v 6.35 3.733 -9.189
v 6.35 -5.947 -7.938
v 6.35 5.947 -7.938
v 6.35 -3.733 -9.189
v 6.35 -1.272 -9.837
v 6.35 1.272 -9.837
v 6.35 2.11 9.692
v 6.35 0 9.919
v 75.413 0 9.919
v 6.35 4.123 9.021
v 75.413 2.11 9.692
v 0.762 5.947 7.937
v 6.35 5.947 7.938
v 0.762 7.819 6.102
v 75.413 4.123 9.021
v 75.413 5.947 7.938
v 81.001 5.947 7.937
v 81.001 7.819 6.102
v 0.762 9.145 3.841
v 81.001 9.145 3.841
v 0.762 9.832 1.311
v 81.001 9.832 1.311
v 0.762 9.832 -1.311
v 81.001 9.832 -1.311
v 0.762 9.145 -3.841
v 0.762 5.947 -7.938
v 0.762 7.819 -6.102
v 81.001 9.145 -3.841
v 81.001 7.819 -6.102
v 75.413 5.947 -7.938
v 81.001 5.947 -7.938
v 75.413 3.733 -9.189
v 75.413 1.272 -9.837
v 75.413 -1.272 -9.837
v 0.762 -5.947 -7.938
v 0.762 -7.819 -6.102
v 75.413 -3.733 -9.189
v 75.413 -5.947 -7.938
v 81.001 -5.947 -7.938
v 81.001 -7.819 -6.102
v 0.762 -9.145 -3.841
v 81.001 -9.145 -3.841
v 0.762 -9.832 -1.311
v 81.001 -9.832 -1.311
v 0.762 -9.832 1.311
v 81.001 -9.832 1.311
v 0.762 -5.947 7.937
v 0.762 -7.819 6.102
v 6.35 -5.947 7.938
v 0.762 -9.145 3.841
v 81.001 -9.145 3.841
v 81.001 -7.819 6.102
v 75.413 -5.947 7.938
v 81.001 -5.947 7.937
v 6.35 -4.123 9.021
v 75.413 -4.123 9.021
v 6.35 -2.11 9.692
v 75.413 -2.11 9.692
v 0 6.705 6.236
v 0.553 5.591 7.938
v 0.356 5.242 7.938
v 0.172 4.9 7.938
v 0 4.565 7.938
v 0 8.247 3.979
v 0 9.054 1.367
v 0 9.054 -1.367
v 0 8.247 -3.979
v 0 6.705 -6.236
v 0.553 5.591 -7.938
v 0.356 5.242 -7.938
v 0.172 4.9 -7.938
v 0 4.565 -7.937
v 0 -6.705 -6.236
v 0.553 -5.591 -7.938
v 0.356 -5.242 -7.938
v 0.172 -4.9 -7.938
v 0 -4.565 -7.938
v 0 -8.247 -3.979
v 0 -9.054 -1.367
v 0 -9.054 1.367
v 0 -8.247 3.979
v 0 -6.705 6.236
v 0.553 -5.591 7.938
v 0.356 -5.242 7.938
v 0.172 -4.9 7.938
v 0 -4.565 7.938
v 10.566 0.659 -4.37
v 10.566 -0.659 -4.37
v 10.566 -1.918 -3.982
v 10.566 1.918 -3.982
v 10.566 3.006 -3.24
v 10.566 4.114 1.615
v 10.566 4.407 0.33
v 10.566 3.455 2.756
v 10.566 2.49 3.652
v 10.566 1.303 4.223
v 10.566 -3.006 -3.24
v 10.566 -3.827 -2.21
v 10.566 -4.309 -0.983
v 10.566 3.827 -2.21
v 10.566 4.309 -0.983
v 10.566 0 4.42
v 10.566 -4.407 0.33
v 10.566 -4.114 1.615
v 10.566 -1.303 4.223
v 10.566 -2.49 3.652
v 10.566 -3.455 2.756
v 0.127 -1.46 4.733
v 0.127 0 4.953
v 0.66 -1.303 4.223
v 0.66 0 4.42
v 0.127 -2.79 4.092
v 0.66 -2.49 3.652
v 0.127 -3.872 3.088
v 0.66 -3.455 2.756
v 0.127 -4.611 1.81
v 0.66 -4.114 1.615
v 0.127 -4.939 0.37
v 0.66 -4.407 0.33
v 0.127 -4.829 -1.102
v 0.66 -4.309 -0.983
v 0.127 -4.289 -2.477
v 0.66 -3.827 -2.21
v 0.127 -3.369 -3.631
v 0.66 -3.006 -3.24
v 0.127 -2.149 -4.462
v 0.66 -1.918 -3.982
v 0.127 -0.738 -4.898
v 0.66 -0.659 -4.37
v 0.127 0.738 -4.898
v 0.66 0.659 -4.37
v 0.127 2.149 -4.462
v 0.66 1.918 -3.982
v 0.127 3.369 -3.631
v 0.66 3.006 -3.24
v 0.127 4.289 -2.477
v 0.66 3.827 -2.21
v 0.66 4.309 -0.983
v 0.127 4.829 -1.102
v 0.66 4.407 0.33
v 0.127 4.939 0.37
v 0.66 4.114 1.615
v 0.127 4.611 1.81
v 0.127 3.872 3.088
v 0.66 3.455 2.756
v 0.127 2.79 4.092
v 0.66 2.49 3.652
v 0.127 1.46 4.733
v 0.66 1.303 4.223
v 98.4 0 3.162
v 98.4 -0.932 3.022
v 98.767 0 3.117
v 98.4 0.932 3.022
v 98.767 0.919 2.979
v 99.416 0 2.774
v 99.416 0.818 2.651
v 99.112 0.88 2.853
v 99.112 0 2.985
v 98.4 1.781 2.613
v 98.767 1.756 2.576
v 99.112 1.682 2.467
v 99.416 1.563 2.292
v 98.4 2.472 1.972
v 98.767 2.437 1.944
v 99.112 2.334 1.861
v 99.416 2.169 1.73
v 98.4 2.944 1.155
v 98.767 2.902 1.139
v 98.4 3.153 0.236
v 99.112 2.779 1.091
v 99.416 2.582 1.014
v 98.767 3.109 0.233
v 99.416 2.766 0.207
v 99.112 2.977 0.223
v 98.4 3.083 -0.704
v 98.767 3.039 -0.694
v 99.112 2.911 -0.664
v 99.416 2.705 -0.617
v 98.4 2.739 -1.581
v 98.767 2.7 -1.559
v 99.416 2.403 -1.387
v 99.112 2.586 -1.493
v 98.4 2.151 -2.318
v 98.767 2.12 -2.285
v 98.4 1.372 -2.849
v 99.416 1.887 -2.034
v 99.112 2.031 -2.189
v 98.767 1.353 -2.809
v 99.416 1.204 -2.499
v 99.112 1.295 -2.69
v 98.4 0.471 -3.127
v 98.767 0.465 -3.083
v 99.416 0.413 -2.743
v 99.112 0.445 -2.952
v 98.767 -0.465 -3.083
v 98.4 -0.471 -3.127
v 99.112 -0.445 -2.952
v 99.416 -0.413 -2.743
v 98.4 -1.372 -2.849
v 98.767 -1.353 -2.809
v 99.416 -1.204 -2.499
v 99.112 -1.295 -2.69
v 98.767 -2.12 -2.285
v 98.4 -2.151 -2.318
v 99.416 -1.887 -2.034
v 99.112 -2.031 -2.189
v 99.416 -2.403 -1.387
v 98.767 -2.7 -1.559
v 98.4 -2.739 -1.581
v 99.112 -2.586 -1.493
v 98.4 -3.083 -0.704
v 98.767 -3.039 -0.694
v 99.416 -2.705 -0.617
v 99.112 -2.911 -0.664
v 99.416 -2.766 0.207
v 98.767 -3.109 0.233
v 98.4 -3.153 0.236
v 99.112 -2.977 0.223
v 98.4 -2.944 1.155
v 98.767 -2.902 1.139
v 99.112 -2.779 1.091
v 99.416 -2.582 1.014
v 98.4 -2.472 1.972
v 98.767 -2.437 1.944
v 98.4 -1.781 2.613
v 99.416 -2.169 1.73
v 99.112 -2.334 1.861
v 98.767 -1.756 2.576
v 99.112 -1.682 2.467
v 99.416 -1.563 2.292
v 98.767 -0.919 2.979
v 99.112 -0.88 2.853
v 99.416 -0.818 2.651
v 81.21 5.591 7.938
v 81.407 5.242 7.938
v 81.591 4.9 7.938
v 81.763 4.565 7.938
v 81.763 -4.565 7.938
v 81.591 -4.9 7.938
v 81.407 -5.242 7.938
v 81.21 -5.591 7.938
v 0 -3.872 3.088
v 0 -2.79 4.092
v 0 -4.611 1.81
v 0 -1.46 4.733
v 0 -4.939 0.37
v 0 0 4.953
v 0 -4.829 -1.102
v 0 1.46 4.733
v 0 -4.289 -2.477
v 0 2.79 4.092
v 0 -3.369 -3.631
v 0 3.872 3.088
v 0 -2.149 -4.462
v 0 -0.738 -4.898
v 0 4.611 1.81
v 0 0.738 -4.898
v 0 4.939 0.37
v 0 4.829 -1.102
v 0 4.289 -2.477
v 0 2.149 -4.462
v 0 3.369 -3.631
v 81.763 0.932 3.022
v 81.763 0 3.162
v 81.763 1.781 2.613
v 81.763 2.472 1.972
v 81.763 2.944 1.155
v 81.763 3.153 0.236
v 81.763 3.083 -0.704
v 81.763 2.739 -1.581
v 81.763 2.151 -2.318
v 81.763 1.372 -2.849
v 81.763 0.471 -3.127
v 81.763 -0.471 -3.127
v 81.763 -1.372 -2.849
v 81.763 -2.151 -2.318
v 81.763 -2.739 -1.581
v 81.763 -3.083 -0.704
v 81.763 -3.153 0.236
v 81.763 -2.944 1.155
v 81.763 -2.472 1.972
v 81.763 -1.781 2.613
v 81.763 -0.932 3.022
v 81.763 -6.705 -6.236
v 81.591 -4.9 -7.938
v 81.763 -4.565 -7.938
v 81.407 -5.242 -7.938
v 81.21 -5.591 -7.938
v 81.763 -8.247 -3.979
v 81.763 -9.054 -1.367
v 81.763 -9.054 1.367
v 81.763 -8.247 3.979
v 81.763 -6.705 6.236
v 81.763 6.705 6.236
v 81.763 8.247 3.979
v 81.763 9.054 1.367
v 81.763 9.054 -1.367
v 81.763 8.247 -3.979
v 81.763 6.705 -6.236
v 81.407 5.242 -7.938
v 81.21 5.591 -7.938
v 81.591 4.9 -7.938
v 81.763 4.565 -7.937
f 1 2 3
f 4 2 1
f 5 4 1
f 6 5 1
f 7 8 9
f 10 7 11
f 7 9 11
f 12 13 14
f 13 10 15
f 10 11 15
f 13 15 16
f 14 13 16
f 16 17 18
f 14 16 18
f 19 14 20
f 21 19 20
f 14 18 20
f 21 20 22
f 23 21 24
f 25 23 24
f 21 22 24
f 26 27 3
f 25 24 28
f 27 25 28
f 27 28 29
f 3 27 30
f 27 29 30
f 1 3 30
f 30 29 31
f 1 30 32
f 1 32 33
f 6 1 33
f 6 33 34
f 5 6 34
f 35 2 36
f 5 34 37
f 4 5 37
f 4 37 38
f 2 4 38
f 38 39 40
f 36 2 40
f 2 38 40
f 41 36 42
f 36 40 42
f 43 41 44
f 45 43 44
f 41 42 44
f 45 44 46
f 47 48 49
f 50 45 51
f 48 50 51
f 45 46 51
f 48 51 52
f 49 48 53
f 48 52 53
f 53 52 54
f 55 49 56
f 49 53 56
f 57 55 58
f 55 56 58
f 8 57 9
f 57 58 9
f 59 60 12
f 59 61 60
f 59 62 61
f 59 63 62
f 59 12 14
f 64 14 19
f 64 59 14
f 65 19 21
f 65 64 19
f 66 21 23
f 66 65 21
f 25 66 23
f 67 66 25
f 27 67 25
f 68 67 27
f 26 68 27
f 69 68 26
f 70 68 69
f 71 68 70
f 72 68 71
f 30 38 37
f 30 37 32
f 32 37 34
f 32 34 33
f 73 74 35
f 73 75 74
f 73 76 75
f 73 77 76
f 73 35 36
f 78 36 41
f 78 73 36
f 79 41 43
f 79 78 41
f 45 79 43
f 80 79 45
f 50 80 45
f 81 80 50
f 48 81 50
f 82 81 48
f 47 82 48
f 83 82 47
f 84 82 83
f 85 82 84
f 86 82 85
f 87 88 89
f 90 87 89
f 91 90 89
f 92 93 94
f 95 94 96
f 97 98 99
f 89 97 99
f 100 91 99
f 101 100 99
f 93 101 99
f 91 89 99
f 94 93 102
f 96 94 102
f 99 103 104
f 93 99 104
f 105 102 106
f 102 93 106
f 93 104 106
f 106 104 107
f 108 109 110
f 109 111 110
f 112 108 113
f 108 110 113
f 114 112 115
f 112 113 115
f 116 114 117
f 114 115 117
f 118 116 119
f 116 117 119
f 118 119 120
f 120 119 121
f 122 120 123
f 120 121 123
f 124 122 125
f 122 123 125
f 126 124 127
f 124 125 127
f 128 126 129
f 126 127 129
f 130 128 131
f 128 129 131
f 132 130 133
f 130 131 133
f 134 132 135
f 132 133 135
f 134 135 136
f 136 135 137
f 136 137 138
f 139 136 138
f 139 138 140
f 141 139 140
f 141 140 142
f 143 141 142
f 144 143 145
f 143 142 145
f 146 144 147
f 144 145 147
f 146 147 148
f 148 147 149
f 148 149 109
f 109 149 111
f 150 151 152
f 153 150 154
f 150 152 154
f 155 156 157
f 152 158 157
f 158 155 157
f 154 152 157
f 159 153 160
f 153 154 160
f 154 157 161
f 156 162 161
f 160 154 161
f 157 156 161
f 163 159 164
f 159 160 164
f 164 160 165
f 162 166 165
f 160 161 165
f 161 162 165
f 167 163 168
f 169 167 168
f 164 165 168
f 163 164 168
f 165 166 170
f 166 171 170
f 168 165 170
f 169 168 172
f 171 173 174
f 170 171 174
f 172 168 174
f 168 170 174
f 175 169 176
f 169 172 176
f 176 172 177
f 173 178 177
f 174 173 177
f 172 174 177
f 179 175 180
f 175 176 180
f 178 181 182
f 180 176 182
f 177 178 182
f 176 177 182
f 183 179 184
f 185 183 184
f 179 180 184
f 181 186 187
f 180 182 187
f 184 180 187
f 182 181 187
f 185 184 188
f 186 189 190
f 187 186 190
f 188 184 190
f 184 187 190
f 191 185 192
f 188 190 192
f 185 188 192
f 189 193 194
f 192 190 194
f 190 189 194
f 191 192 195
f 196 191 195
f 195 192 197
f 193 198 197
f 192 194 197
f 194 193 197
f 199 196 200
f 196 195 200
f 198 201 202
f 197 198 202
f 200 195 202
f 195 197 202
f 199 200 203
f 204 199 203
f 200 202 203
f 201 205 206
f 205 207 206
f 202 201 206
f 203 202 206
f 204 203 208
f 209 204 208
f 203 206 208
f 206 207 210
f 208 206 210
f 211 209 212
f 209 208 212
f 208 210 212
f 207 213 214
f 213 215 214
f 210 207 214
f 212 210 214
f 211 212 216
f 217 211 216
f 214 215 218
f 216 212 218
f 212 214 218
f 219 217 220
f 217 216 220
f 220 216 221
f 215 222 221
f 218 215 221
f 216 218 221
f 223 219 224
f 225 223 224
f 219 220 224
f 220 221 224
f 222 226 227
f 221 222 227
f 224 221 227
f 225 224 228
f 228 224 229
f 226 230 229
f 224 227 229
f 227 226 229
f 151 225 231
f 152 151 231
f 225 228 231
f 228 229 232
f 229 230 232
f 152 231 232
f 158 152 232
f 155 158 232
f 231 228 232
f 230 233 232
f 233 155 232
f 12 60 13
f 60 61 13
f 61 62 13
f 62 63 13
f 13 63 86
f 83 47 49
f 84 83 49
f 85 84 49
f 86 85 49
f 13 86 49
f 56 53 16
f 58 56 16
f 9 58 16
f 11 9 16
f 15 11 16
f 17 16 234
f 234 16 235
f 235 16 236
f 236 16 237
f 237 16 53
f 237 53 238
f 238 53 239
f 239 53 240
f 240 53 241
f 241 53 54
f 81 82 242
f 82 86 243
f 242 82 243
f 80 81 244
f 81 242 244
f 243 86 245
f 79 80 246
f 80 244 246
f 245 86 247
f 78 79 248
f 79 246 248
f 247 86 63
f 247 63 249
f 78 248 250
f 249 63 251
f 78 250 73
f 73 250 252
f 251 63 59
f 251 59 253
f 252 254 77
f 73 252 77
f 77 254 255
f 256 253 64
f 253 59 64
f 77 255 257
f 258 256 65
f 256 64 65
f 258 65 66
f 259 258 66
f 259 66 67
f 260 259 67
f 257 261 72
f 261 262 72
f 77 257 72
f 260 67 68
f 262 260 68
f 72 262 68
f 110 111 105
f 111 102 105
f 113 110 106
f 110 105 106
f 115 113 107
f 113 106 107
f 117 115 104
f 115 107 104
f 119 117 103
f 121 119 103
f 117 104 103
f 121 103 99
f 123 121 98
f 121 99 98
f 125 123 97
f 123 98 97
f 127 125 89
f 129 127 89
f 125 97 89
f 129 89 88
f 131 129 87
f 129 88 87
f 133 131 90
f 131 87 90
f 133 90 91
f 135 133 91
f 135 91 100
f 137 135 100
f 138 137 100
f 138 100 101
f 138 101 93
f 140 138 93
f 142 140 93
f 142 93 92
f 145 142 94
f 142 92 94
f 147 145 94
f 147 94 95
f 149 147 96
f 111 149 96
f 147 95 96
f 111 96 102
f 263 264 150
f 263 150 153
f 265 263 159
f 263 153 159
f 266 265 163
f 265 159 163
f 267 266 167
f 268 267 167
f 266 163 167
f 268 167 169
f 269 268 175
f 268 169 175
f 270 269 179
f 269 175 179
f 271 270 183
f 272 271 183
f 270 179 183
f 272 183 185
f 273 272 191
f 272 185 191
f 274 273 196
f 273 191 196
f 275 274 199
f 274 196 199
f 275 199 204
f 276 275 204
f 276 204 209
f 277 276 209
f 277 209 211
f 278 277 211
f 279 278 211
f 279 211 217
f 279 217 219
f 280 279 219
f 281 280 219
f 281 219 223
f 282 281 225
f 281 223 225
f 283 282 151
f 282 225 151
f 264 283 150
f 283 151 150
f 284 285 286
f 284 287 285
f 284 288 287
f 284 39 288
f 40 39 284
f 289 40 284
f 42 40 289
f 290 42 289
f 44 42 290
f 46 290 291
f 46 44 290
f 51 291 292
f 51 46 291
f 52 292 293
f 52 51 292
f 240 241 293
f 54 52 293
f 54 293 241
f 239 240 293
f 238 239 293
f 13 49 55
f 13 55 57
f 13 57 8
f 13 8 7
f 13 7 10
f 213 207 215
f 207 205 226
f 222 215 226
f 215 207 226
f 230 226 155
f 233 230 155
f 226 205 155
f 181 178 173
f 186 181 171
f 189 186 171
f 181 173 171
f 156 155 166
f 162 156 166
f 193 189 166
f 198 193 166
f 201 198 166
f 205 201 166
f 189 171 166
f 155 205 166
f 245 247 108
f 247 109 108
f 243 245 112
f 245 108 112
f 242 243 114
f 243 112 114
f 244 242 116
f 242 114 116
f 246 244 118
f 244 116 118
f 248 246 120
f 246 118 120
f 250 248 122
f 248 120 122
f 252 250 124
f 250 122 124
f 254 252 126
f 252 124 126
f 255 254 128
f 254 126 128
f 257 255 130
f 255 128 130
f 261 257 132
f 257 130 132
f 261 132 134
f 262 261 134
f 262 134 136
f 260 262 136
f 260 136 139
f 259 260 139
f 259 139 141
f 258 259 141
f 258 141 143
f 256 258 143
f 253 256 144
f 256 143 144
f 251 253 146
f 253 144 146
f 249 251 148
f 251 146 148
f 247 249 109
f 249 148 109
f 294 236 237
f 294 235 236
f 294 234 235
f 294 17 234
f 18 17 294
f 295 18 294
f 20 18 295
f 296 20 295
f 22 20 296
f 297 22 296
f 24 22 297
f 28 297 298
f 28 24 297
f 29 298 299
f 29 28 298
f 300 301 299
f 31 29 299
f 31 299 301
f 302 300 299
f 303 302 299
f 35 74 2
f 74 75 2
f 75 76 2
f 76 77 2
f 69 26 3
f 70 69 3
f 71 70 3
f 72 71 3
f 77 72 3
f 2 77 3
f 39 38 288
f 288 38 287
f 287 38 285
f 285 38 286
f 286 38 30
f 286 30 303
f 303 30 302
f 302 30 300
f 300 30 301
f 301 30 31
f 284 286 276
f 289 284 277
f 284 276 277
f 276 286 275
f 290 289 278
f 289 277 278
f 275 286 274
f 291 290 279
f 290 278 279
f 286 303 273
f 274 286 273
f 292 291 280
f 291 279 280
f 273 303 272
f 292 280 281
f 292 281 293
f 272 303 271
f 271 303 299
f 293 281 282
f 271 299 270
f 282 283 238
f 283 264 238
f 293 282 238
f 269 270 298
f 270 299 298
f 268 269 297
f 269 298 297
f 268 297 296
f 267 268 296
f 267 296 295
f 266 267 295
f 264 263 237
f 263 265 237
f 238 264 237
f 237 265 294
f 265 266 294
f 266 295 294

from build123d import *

# Parameters (mm, degrees)
CHAMFER1_SIZE           = 0.762
SKETCH5_W               = 6.35
SKETCH5_H               = 1.981
CUT_EXTRUDE1_DEPTH      = 10.9185
CUT_EXTRUDE1_DEPTH_BACK = 10.9185
SKETCH6_W               = 6.35
SKETCH6_H               = 1.981
CUT_EXTRUDE2_DEPTH      = 10.9185
CUT_EXTRUDE2_DEPTH_BACK = 10.9185


with BuildPart() as part:
    # Sketch1 → Revolve1 (revolve)
    with BuildSketch(Plane(origin=(0, 0, 0), x_dir=(-1, 0, 0), z_dir=(0, 0, -1)), mode=Mode.PRIVATE) as revolve1_sk:
        with BuildLine():
            Line((-99.4156, 2.774222533), (-99.4156, 0))
            Line((-99.4156, 0), (0, 0))
            Line((0, 0), (0, 9.9185))
            Line((0, 9.9185), (-81.7626, 9.9185))
            Line((-81.7626, 9.9185), (-81.7626, 3.1623))
            Line((-81.7626, 3.1623), (-98.3996, 3.1623))
            ThreePointArc((-98.3996, 3.1623), (-98.943396865, 3.061978675), (-99.4156, 2.774222533))
        make_face()
    revolve(revolve1_sk.sketch.rotate(Axis((99.4156, 0, 0), (-1, 0, 0)), 270), axis=Axis((99.4156, 0, 0), (-1, 0, 0)))  # turned: the seam where the file's is

    # Sketch2 → Cut-Revolve1 (revolve, cut)
    with BuildSketch(Plane(origin=(0, 0, 0), x_dir=(-1, 0, 0), z_dir=(0, 0, -1)), mode=Mode.PRIVATE) as cut_revolve1_sk:
        Polygon((0, 0), (0, 4.953), (-0.127, 4.953), (-0.6604, 4.4196), (-10.5664, 4.4196), (-10.5664, 0), align=None)
    revolve(cut_revolve1_sk.sketch.rotate(Axis((0, 0, 0), (1, 0, 0)), 90), axis=Axis((0, 0, 0), (1, 0, 0)), mode=Mode.SUBTRACT)  # turned: the seam where the file's is

    # Chamfer1
    chamfer1_edges = [part.edges().sort_by_distance(p)[0] for p in [
        (81.7626, 0, -9.9185),
        (0, 0, -9.9185),
    ]]
    chamfer(chamfer1_edges, length=CHAMFER1_SIZE)

    # Sketch5 → Cut-Extrude1 (cut, two sides)
    with BuildSketch(Plane(origin=(0, 0, 0), x_dir=(1, 0, 0), z_dir=(0, 1, 0))) as cut_extrude1_sk:
        with Locations((3.175, 8.928)):
            Rectangle(SKETCH5_W, SKETCH5_H)
        with Locations((3.175, -8.928)):
            Rectangle(SKETCH5_W, SKETCH5_H)
    extrude(amount=CUT_EXTRUDE1_DEPTH, mode=Mode.SUBTRACT)
    extrude(cut_extrude1_sk.sketch, amount=-CUT_EXTRUDE1_DEPTH_BACK, mode=Mode.SUBTRACT)

    # Sketch6 → Cut-Extrude2 (cut, two sides)
    with BuildSketch(Plane(origin=(0, 0, 0), x_dir=(1, 0, 0), z_dir=(0, 1, 0))) as cut_extrude2_sk:
        with Locations((78.5876, 8.928)):
            Rectangle(SKETCH6_W, SKETCH6_H)
        with Locations((78.5876, -8.928)):
            Rectangle(SKETCH6_W, SKETCH6_H)
    extrude(amount=CUT_EXTRUDE2_DEPTH, mode=Mode.SUBTRACT)
    extrude(cut_extrude2_sk.sketch, amount=-CUT_EXTRUDE2_DEPTH_BACK, mode=Mode.SUBTRACT)


solid = part.part
